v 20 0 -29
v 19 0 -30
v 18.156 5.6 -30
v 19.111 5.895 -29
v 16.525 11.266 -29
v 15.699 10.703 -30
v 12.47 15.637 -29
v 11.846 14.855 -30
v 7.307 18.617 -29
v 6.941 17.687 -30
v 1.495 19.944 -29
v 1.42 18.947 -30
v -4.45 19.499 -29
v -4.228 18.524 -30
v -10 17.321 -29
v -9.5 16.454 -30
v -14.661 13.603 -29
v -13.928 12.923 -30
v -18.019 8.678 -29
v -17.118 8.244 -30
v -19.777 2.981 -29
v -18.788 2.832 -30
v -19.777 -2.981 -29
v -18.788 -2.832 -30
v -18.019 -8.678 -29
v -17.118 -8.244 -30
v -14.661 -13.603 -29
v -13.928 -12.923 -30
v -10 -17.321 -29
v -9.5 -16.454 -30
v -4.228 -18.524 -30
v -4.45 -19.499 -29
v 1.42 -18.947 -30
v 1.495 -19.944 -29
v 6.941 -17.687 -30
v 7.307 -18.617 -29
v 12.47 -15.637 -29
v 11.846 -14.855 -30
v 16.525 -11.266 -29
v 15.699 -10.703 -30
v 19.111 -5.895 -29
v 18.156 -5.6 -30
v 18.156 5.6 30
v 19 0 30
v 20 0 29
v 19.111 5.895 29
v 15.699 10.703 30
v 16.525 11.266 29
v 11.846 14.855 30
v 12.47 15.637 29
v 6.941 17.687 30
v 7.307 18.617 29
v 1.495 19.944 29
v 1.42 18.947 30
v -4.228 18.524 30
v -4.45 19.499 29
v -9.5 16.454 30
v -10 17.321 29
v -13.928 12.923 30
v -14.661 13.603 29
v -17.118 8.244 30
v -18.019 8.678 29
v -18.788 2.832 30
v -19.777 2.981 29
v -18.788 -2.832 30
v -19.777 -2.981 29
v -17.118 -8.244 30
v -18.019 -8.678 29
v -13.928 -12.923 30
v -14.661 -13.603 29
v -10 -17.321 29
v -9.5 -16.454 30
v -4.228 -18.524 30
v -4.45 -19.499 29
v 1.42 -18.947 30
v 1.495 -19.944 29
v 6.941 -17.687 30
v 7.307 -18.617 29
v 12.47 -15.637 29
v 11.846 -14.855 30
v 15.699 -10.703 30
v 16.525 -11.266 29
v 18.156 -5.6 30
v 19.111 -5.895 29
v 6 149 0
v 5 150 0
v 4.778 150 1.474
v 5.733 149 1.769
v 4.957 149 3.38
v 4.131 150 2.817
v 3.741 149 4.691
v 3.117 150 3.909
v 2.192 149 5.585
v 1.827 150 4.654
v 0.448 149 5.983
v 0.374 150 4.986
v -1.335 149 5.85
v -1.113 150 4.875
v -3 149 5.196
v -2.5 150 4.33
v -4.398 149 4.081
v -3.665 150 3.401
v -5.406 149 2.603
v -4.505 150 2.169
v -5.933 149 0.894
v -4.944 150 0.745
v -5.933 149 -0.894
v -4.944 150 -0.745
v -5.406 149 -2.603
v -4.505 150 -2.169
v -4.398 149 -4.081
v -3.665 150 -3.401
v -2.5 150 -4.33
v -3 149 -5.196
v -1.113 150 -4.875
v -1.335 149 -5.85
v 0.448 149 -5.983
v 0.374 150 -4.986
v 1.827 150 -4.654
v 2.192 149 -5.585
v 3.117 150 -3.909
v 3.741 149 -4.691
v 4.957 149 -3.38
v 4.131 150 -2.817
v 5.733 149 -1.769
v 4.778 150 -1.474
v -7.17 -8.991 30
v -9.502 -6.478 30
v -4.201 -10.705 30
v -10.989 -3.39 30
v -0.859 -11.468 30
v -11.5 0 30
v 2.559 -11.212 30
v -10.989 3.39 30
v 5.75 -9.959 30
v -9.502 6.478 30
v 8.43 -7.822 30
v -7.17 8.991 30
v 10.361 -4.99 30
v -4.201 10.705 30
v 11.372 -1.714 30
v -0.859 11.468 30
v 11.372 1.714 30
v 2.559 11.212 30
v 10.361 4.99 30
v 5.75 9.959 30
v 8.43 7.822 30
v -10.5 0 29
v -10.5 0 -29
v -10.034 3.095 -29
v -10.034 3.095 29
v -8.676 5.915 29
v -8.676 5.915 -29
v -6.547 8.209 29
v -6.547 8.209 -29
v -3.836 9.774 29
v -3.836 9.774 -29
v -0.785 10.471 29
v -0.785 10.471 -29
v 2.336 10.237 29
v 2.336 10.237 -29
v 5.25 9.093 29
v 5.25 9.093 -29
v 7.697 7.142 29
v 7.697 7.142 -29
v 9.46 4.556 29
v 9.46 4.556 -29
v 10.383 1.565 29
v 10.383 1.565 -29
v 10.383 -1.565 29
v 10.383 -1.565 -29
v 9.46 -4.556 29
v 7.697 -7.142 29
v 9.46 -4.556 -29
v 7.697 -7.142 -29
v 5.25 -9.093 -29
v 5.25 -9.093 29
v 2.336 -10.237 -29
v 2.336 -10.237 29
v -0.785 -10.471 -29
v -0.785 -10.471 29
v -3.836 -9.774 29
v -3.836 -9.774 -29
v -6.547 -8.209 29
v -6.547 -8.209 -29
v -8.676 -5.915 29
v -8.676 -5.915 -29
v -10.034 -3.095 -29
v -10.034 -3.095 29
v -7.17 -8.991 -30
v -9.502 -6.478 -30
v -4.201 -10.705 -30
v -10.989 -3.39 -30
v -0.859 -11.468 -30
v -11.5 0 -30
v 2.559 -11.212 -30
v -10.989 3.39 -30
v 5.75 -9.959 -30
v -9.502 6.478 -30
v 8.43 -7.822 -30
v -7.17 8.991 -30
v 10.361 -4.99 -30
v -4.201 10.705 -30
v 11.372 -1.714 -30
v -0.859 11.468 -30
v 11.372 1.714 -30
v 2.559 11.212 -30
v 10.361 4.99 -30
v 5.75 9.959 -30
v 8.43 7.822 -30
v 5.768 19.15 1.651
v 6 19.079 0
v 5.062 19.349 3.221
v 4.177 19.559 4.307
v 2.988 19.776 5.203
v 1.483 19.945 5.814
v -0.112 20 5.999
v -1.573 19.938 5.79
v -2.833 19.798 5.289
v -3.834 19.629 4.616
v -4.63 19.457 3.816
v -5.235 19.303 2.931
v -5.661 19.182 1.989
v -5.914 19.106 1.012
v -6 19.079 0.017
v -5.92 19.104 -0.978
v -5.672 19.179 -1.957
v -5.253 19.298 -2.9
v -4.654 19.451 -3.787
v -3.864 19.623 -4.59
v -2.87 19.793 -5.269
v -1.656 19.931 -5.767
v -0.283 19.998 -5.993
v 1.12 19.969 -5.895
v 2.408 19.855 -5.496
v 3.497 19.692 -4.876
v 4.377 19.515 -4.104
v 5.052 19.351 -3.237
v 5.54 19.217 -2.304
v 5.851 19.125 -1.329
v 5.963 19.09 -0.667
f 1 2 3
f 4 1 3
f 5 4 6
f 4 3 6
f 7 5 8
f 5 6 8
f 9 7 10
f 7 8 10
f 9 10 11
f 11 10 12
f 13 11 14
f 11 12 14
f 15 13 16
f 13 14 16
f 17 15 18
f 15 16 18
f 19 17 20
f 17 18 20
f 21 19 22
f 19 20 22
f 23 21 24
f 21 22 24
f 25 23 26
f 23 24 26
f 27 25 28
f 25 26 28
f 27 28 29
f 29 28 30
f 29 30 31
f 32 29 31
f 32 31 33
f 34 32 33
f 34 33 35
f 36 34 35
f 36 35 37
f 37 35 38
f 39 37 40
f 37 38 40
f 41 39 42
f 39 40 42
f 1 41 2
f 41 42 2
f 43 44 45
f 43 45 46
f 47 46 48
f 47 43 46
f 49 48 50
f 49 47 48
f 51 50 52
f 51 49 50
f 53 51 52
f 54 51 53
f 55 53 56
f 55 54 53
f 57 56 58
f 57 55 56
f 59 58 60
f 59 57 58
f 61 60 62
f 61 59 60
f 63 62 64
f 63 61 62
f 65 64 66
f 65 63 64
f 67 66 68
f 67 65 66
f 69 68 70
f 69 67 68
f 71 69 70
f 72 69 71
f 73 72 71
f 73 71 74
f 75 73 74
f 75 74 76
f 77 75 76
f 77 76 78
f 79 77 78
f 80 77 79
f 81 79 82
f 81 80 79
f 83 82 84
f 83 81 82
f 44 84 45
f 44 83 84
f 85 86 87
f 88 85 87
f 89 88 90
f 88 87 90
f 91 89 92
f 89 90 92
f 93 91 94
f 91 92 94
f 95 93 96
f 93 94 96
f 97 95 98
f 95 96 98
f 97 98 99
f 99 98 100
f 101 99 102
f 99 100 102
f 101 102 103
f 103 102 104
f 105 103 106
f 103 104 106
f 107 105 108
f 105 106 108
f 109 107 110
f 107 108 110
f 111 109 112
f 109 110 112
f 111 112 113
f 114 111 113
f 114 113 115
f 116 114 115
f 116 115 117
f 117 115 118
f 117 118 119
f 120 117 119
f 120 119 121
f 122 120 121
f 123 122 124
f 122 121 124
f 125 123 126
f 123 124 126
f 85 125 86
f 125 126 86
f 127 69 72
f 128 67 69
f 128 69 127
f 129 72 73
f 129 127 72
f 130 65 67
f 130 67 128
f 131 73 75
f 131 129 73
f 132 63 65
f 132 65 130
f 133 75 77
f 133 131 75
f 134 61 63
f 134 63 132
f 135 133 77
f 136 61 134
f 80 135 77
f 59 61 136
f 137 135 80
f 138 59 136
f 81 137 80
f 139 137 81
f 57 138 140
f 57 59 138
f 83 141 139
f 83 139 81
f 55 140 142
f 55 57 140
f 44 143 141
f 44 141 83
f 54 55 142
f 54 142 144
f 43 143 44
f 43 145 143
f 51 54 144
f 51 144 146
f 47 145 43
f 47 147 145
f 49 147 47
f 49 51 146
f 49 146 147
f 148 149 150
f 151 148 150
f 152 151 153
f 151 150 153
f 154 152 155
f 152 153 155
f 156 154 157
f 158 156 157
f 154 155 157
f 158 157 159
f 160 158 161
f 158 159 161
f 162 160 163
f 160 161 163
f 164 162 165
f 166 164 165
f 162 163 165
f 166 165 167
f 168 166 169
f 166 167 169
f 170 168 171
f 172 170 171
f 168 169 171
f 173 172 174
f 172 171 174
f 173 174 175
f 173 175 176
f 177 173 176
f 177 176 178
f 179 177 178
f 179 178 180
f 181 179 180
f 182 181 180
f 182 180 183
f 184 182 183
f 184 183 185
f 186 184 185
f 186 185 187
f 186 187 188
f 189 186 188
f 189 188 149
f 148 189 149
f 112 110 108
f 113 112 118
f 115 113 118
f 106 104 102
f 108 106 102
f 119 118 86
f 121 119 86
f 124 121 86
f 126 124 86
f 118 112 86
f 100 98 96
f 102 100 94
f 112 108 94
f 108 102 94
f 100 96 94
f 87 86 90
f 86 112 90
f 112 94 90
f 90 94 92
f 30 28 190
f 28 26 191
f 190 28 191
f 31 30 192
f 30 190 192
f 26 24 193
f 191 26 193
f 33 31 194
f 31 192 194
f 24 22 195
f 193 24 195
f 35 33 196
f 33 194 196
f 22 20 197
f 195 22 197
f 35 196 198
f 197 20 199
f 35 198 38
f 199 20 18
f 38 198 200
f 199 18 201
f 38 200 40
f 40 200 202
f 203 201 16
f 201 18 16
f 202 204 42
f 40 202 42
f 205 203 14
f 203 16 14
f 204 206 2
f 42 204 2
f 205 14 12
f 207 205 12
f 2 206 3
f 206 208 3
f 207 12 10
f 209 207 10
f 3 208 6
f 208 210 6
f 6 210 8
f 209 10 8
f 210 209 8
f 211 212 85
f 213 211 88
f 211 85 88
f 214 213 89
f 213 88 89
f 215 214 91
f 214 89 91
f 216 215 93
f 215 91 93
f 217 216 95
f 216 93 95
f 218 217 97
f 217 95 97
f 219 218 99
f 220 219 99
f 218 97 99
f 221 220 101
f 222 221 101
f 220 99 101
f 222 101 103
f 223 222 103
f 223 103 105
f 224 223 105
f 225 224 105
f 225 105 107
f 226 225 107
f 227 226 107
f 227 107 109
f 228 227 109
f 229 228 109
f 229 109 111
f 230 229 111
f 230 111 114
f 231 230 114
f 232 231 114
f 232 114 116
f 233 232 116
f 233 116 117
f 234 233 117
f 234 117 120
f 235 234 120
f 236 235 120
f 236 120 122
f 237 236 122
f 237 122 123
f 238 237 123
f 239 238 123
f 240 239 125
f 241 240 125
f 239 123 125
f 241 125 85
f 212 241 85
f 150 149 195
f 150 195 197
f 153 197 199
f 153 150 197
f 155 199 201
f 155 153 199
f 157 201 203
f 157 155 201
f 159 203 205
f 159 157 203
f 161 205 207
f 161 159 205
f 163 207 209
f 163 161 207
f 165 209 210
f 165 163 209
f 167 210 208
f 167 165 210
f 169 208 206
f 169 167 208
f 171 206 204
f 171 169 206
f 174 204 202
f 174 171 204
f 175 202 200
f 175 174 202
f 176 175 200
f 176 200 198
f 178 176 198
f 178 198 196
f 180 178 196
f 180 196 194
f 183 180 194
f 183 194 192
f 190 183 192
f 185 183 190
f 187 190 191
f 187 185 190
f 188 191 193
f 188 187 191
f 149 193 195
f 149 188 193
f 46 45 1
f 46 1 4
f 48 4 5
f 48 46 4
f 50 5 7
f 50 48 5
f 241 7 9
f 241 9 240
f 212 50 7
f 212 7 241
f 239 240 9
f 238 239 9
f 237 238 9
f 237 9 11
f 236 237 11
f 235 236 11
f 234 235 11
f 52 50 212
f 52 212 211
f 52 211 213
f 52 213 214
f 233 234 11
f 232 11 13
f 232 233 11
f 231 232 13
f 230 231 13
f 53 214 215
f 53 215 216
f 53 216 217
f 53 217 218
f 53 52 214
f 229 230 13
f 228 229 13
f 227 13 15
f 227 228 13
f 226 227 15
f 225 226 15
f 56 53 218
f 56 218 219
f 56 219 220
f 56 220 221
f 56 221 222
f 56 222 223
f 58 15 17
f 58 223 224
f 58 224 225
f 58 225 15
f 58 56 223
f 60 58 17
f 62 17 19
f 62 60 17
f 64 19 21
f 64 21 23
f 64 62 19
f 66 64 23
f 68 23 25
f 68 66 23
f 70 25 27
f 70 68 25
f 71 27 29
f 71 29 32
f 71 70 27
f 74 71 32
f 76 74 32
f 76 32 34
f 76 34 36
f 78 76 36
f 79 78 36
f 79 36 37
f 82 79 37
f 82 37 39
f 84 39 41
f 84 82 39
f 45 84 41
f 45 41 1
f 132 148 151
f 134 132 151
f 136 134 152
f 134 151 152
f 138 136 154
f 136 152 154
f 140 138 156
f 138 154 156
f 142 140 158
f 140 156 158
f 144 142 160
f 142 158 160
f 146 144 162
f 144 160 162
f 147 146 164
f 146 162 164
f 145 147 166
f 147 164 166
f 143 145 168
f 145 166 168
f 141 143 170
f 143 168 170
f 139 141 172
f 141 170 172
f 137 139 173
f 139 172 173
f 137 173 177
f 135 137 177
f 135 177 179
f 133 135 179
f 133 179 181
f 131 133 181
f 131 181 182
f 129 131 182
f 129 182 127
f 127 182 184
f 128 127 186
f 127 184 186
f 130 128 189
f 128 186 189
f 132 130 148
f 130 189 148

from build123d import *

# Parameters (mm, degrees)
F0_R     = 20
F1_DEPTH = 30
F3_D     = 21
F5_R     = 6
F7_SIZE  = 1


with BuildPart() as f1:
    # F0 (on Top) → F1 (new body, symmetric)
    with BuildSketch(Plane.XY):
        Circle(F0_R)
    extrude(amount=F1_DEPTH, both=True)

    # F3 (through all)
    with Locations(Plane.XY.offset(30)):
        with Locations((0, 0)):
            Hole(F3_D / 2)

    # F5 (on offset) → F6 (join, up to the next surface of F1)
    with BuildSketch(Plane.XZ.offset(-150)):
        Circle(F5_R)
    extrude(until=Until.NEXT)

    # F7
    f7_edges = [f1.edges().sort_by_distance(p)[0] for p in [
        (-6, 150, 0),
        (-20, 0, 30),
        (-20, 0, -30),
        (-10.5, 0, 30),
        (-10.5, 0, -30),
    ]]
    chamfer(f7_edges, length=F7_SIZE)


solid = f1.part
